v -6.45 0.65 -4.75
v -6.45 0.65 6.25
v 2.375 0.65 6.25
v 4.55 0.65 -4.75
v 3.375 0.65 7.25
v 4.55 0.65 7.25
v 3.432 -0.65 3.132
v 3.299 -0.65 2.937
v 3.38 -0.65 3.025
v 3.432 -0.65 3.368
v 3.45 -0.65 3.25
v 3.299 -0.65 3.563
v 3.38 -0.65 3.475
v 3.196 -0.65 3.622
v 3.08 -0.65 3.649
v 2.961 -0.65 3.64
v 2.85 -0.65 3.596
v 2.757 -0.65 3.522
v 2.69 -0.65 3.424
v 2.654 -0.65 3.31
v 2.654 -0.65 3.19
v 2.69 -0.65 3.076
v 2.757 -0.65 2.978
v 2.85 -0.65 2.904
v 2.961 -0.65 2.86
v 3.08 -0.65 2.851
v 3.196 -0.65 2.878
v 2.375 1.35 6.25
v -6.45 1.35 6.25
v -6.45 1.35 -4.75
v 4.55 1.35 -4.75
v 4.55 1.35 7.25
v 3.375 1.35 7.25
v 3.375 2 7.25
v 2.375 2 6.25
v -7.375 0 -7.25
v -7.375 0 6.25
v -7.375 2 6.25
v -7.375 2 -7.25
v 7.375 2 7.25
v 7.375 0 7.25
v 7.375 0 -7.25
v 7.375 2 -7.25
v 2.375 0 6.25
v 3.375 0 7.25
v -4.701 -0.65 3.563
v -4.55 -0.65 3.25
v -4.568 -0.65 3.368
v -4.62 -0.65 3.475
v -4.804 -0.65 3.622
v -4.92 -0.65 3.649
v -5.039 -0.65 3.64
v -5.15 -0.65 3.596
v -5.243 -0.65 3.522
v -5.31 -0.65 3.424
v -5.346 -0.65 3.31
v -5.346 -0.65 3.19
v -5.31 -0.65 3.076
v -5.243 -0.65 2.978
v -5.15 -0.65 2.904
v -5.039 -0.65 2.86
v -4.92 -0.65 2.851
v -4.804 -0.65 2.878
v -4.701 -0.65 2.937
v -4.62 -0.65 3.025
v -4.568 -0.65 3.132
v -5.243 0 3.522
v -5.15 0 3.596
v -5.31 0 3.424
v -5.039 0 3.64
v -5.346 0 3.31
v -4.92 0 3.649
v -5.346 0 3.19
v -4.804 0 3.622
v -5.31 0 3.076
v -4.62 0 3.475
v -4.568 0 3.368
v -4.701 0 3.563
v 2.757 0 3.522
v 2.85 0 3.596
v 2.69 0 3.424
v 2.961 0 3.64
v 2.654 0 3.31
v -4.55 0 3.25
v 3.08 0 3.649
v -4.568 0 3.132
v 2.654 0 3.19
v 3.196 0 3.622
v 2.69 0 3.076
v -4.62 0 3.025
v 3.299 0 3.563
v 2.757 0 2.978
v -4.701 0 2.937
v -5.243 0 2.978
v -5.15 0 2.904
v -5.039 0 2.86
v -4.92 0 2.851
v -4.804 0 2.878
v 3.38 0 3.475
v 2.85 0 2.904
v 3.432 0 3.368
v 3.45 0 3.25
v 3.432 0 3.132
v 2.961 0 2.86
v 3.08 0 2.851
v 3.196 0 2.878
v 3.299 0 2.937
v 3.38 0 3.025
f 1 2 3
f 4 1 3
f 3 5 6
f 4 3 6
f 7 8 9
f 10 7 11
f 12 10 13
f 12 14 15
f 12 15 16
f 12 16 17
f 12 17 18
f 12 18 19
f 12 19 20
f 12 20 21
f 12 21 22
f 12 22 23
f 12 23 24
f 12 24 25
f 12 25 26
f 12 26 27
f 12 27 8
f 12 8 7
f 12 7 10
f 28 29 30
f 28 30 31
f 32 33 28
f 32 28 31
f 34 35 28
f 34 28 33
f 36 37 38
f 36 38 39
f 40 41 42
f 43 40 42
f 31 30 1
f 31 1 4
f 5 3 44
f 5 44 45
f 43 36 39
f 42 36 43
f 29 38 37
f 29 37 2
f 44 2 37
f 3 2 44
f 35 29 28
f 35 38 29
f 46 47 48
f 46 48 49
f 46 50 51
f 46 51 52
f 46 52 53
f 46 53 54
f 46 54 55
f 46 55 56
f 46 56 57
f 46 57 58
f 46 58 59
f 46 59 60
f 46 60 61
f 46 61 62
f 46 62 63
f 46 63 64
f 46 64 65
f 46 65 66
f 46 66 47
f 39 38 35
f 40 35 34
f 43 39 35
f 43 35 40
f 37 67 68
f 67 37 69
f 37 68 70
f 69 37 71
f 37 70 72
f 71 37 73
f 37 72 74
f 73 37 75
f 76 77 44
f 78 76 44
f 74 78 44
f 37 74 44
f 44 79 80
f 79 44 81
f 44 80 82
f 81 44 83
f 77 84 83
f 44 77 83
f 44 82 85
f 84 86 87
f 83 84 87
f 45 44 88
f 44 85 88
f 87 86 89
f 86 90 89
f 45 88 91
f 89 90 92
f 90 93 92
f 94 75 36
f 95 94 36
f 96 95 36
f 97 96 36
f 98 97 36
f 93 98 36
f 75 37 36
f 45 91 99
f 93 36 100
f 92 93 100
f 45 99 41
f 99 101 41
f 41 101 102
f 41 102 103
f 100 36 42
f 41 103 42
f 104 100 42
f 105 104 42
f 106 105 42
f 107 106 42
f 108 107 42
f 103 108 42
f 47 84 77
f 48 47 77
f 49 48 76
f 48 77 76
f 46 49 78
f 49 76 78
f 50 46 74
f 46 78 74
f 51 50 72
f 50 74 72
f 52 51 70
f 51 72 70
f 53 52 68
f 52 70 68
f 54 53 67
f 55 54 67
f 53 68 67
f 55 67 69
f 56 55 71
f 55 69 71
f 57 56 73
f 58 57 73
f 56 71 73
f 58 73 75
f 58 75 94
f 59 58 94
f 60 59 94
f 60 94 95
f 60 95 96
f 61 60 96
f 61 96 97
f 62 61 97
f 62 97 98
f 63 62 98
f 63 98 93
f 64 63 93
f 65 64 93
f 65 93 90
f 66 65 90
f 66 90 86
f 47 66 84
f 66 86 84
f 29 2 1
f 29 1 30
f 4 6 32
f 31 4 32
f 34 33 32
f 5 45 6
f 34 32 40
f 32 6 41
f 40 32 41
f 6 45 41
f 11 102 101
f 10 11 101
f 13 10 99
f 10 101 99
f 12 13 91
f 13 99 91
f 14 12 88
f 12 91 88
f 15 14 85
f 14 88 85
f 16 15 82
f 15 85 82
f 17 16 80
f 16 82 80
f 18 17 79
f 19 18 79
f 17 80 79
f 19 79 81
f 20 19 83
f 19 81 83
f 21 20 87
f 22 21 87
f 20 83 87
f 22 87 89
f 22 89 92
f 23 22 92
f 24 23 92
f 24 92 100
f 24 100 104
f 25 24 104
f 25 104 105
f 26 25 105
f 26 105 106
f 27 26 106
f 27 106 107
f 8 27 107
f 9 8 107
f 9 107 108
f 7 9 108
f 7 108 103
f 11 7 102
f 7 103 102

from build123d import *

# Parameters (mm, degrees)
SKETCH1_W           = 14.75
SKETCH1_H           = 14.5
BOSS_EXTRUDE1_DEPTH = 2
CUT_EXTRUDE1_DEPTH  = 2
SKETCH3_W           = 11
SKETCH3_H           = 0.7
CUT_EXTRUDE2_DEPTH  = 12
SKETCH4_R           = 0.4
BOSS_EXTRUDE2_DEPTH = 0.65


with BuildPart() as part:
    # Sketch1 → Boss-Extrude1 (new body)
    with BuildSketch(Plane(origin=(0, 0, 0), x_dir=(1, 0, 0), z_dir=(0, 1, 0))):
        Rectangle(SKETCH1_W, SKETCH1_H)
    extrude(amount=BOSS_EXTRUDE1_DEPTH)

    # Sketch2 → Cut-Extrude1 (cut)
    with BuildSketch(Plane(origin=(0, 2, 0), x_dir=(1, 0, 0), z_dir=(0, 1, 0))):
        Polygon((-7.375, -6.25), (2.375, -6.25), (3.375, -7.25), (-7.375, -7.25), align=None)
    extrude(amount=-CUT_EXTRUDE1_DEPTH, mode=Mode.SUBTRACT)

    # Sketch3 → Cut-Extrude2 (cut)
    with BuildSketch(Plane.XY.offset(7.25)):
        with Locations((-0.95, 1)):
            Rectangle(SKETCH3_W, SKETCH3_H)
    extrude(amount=-CUT_EXTRUDE2_DEPTH, mode=Mode.SUBTRACT)

    # Sketch4 → Boss-Extrude2 (add)
    with BuildSketch(Plane.XZ):
        with Locations((-4.95, 3.25)):
            Circle(SKETCH4_R)
        with Locations((3.05, 3.25)):
            Circle(SKETCH4_R)
    extrude(amount=BOSS_EXTRUDE2_DEPTH)


solid = part.part
